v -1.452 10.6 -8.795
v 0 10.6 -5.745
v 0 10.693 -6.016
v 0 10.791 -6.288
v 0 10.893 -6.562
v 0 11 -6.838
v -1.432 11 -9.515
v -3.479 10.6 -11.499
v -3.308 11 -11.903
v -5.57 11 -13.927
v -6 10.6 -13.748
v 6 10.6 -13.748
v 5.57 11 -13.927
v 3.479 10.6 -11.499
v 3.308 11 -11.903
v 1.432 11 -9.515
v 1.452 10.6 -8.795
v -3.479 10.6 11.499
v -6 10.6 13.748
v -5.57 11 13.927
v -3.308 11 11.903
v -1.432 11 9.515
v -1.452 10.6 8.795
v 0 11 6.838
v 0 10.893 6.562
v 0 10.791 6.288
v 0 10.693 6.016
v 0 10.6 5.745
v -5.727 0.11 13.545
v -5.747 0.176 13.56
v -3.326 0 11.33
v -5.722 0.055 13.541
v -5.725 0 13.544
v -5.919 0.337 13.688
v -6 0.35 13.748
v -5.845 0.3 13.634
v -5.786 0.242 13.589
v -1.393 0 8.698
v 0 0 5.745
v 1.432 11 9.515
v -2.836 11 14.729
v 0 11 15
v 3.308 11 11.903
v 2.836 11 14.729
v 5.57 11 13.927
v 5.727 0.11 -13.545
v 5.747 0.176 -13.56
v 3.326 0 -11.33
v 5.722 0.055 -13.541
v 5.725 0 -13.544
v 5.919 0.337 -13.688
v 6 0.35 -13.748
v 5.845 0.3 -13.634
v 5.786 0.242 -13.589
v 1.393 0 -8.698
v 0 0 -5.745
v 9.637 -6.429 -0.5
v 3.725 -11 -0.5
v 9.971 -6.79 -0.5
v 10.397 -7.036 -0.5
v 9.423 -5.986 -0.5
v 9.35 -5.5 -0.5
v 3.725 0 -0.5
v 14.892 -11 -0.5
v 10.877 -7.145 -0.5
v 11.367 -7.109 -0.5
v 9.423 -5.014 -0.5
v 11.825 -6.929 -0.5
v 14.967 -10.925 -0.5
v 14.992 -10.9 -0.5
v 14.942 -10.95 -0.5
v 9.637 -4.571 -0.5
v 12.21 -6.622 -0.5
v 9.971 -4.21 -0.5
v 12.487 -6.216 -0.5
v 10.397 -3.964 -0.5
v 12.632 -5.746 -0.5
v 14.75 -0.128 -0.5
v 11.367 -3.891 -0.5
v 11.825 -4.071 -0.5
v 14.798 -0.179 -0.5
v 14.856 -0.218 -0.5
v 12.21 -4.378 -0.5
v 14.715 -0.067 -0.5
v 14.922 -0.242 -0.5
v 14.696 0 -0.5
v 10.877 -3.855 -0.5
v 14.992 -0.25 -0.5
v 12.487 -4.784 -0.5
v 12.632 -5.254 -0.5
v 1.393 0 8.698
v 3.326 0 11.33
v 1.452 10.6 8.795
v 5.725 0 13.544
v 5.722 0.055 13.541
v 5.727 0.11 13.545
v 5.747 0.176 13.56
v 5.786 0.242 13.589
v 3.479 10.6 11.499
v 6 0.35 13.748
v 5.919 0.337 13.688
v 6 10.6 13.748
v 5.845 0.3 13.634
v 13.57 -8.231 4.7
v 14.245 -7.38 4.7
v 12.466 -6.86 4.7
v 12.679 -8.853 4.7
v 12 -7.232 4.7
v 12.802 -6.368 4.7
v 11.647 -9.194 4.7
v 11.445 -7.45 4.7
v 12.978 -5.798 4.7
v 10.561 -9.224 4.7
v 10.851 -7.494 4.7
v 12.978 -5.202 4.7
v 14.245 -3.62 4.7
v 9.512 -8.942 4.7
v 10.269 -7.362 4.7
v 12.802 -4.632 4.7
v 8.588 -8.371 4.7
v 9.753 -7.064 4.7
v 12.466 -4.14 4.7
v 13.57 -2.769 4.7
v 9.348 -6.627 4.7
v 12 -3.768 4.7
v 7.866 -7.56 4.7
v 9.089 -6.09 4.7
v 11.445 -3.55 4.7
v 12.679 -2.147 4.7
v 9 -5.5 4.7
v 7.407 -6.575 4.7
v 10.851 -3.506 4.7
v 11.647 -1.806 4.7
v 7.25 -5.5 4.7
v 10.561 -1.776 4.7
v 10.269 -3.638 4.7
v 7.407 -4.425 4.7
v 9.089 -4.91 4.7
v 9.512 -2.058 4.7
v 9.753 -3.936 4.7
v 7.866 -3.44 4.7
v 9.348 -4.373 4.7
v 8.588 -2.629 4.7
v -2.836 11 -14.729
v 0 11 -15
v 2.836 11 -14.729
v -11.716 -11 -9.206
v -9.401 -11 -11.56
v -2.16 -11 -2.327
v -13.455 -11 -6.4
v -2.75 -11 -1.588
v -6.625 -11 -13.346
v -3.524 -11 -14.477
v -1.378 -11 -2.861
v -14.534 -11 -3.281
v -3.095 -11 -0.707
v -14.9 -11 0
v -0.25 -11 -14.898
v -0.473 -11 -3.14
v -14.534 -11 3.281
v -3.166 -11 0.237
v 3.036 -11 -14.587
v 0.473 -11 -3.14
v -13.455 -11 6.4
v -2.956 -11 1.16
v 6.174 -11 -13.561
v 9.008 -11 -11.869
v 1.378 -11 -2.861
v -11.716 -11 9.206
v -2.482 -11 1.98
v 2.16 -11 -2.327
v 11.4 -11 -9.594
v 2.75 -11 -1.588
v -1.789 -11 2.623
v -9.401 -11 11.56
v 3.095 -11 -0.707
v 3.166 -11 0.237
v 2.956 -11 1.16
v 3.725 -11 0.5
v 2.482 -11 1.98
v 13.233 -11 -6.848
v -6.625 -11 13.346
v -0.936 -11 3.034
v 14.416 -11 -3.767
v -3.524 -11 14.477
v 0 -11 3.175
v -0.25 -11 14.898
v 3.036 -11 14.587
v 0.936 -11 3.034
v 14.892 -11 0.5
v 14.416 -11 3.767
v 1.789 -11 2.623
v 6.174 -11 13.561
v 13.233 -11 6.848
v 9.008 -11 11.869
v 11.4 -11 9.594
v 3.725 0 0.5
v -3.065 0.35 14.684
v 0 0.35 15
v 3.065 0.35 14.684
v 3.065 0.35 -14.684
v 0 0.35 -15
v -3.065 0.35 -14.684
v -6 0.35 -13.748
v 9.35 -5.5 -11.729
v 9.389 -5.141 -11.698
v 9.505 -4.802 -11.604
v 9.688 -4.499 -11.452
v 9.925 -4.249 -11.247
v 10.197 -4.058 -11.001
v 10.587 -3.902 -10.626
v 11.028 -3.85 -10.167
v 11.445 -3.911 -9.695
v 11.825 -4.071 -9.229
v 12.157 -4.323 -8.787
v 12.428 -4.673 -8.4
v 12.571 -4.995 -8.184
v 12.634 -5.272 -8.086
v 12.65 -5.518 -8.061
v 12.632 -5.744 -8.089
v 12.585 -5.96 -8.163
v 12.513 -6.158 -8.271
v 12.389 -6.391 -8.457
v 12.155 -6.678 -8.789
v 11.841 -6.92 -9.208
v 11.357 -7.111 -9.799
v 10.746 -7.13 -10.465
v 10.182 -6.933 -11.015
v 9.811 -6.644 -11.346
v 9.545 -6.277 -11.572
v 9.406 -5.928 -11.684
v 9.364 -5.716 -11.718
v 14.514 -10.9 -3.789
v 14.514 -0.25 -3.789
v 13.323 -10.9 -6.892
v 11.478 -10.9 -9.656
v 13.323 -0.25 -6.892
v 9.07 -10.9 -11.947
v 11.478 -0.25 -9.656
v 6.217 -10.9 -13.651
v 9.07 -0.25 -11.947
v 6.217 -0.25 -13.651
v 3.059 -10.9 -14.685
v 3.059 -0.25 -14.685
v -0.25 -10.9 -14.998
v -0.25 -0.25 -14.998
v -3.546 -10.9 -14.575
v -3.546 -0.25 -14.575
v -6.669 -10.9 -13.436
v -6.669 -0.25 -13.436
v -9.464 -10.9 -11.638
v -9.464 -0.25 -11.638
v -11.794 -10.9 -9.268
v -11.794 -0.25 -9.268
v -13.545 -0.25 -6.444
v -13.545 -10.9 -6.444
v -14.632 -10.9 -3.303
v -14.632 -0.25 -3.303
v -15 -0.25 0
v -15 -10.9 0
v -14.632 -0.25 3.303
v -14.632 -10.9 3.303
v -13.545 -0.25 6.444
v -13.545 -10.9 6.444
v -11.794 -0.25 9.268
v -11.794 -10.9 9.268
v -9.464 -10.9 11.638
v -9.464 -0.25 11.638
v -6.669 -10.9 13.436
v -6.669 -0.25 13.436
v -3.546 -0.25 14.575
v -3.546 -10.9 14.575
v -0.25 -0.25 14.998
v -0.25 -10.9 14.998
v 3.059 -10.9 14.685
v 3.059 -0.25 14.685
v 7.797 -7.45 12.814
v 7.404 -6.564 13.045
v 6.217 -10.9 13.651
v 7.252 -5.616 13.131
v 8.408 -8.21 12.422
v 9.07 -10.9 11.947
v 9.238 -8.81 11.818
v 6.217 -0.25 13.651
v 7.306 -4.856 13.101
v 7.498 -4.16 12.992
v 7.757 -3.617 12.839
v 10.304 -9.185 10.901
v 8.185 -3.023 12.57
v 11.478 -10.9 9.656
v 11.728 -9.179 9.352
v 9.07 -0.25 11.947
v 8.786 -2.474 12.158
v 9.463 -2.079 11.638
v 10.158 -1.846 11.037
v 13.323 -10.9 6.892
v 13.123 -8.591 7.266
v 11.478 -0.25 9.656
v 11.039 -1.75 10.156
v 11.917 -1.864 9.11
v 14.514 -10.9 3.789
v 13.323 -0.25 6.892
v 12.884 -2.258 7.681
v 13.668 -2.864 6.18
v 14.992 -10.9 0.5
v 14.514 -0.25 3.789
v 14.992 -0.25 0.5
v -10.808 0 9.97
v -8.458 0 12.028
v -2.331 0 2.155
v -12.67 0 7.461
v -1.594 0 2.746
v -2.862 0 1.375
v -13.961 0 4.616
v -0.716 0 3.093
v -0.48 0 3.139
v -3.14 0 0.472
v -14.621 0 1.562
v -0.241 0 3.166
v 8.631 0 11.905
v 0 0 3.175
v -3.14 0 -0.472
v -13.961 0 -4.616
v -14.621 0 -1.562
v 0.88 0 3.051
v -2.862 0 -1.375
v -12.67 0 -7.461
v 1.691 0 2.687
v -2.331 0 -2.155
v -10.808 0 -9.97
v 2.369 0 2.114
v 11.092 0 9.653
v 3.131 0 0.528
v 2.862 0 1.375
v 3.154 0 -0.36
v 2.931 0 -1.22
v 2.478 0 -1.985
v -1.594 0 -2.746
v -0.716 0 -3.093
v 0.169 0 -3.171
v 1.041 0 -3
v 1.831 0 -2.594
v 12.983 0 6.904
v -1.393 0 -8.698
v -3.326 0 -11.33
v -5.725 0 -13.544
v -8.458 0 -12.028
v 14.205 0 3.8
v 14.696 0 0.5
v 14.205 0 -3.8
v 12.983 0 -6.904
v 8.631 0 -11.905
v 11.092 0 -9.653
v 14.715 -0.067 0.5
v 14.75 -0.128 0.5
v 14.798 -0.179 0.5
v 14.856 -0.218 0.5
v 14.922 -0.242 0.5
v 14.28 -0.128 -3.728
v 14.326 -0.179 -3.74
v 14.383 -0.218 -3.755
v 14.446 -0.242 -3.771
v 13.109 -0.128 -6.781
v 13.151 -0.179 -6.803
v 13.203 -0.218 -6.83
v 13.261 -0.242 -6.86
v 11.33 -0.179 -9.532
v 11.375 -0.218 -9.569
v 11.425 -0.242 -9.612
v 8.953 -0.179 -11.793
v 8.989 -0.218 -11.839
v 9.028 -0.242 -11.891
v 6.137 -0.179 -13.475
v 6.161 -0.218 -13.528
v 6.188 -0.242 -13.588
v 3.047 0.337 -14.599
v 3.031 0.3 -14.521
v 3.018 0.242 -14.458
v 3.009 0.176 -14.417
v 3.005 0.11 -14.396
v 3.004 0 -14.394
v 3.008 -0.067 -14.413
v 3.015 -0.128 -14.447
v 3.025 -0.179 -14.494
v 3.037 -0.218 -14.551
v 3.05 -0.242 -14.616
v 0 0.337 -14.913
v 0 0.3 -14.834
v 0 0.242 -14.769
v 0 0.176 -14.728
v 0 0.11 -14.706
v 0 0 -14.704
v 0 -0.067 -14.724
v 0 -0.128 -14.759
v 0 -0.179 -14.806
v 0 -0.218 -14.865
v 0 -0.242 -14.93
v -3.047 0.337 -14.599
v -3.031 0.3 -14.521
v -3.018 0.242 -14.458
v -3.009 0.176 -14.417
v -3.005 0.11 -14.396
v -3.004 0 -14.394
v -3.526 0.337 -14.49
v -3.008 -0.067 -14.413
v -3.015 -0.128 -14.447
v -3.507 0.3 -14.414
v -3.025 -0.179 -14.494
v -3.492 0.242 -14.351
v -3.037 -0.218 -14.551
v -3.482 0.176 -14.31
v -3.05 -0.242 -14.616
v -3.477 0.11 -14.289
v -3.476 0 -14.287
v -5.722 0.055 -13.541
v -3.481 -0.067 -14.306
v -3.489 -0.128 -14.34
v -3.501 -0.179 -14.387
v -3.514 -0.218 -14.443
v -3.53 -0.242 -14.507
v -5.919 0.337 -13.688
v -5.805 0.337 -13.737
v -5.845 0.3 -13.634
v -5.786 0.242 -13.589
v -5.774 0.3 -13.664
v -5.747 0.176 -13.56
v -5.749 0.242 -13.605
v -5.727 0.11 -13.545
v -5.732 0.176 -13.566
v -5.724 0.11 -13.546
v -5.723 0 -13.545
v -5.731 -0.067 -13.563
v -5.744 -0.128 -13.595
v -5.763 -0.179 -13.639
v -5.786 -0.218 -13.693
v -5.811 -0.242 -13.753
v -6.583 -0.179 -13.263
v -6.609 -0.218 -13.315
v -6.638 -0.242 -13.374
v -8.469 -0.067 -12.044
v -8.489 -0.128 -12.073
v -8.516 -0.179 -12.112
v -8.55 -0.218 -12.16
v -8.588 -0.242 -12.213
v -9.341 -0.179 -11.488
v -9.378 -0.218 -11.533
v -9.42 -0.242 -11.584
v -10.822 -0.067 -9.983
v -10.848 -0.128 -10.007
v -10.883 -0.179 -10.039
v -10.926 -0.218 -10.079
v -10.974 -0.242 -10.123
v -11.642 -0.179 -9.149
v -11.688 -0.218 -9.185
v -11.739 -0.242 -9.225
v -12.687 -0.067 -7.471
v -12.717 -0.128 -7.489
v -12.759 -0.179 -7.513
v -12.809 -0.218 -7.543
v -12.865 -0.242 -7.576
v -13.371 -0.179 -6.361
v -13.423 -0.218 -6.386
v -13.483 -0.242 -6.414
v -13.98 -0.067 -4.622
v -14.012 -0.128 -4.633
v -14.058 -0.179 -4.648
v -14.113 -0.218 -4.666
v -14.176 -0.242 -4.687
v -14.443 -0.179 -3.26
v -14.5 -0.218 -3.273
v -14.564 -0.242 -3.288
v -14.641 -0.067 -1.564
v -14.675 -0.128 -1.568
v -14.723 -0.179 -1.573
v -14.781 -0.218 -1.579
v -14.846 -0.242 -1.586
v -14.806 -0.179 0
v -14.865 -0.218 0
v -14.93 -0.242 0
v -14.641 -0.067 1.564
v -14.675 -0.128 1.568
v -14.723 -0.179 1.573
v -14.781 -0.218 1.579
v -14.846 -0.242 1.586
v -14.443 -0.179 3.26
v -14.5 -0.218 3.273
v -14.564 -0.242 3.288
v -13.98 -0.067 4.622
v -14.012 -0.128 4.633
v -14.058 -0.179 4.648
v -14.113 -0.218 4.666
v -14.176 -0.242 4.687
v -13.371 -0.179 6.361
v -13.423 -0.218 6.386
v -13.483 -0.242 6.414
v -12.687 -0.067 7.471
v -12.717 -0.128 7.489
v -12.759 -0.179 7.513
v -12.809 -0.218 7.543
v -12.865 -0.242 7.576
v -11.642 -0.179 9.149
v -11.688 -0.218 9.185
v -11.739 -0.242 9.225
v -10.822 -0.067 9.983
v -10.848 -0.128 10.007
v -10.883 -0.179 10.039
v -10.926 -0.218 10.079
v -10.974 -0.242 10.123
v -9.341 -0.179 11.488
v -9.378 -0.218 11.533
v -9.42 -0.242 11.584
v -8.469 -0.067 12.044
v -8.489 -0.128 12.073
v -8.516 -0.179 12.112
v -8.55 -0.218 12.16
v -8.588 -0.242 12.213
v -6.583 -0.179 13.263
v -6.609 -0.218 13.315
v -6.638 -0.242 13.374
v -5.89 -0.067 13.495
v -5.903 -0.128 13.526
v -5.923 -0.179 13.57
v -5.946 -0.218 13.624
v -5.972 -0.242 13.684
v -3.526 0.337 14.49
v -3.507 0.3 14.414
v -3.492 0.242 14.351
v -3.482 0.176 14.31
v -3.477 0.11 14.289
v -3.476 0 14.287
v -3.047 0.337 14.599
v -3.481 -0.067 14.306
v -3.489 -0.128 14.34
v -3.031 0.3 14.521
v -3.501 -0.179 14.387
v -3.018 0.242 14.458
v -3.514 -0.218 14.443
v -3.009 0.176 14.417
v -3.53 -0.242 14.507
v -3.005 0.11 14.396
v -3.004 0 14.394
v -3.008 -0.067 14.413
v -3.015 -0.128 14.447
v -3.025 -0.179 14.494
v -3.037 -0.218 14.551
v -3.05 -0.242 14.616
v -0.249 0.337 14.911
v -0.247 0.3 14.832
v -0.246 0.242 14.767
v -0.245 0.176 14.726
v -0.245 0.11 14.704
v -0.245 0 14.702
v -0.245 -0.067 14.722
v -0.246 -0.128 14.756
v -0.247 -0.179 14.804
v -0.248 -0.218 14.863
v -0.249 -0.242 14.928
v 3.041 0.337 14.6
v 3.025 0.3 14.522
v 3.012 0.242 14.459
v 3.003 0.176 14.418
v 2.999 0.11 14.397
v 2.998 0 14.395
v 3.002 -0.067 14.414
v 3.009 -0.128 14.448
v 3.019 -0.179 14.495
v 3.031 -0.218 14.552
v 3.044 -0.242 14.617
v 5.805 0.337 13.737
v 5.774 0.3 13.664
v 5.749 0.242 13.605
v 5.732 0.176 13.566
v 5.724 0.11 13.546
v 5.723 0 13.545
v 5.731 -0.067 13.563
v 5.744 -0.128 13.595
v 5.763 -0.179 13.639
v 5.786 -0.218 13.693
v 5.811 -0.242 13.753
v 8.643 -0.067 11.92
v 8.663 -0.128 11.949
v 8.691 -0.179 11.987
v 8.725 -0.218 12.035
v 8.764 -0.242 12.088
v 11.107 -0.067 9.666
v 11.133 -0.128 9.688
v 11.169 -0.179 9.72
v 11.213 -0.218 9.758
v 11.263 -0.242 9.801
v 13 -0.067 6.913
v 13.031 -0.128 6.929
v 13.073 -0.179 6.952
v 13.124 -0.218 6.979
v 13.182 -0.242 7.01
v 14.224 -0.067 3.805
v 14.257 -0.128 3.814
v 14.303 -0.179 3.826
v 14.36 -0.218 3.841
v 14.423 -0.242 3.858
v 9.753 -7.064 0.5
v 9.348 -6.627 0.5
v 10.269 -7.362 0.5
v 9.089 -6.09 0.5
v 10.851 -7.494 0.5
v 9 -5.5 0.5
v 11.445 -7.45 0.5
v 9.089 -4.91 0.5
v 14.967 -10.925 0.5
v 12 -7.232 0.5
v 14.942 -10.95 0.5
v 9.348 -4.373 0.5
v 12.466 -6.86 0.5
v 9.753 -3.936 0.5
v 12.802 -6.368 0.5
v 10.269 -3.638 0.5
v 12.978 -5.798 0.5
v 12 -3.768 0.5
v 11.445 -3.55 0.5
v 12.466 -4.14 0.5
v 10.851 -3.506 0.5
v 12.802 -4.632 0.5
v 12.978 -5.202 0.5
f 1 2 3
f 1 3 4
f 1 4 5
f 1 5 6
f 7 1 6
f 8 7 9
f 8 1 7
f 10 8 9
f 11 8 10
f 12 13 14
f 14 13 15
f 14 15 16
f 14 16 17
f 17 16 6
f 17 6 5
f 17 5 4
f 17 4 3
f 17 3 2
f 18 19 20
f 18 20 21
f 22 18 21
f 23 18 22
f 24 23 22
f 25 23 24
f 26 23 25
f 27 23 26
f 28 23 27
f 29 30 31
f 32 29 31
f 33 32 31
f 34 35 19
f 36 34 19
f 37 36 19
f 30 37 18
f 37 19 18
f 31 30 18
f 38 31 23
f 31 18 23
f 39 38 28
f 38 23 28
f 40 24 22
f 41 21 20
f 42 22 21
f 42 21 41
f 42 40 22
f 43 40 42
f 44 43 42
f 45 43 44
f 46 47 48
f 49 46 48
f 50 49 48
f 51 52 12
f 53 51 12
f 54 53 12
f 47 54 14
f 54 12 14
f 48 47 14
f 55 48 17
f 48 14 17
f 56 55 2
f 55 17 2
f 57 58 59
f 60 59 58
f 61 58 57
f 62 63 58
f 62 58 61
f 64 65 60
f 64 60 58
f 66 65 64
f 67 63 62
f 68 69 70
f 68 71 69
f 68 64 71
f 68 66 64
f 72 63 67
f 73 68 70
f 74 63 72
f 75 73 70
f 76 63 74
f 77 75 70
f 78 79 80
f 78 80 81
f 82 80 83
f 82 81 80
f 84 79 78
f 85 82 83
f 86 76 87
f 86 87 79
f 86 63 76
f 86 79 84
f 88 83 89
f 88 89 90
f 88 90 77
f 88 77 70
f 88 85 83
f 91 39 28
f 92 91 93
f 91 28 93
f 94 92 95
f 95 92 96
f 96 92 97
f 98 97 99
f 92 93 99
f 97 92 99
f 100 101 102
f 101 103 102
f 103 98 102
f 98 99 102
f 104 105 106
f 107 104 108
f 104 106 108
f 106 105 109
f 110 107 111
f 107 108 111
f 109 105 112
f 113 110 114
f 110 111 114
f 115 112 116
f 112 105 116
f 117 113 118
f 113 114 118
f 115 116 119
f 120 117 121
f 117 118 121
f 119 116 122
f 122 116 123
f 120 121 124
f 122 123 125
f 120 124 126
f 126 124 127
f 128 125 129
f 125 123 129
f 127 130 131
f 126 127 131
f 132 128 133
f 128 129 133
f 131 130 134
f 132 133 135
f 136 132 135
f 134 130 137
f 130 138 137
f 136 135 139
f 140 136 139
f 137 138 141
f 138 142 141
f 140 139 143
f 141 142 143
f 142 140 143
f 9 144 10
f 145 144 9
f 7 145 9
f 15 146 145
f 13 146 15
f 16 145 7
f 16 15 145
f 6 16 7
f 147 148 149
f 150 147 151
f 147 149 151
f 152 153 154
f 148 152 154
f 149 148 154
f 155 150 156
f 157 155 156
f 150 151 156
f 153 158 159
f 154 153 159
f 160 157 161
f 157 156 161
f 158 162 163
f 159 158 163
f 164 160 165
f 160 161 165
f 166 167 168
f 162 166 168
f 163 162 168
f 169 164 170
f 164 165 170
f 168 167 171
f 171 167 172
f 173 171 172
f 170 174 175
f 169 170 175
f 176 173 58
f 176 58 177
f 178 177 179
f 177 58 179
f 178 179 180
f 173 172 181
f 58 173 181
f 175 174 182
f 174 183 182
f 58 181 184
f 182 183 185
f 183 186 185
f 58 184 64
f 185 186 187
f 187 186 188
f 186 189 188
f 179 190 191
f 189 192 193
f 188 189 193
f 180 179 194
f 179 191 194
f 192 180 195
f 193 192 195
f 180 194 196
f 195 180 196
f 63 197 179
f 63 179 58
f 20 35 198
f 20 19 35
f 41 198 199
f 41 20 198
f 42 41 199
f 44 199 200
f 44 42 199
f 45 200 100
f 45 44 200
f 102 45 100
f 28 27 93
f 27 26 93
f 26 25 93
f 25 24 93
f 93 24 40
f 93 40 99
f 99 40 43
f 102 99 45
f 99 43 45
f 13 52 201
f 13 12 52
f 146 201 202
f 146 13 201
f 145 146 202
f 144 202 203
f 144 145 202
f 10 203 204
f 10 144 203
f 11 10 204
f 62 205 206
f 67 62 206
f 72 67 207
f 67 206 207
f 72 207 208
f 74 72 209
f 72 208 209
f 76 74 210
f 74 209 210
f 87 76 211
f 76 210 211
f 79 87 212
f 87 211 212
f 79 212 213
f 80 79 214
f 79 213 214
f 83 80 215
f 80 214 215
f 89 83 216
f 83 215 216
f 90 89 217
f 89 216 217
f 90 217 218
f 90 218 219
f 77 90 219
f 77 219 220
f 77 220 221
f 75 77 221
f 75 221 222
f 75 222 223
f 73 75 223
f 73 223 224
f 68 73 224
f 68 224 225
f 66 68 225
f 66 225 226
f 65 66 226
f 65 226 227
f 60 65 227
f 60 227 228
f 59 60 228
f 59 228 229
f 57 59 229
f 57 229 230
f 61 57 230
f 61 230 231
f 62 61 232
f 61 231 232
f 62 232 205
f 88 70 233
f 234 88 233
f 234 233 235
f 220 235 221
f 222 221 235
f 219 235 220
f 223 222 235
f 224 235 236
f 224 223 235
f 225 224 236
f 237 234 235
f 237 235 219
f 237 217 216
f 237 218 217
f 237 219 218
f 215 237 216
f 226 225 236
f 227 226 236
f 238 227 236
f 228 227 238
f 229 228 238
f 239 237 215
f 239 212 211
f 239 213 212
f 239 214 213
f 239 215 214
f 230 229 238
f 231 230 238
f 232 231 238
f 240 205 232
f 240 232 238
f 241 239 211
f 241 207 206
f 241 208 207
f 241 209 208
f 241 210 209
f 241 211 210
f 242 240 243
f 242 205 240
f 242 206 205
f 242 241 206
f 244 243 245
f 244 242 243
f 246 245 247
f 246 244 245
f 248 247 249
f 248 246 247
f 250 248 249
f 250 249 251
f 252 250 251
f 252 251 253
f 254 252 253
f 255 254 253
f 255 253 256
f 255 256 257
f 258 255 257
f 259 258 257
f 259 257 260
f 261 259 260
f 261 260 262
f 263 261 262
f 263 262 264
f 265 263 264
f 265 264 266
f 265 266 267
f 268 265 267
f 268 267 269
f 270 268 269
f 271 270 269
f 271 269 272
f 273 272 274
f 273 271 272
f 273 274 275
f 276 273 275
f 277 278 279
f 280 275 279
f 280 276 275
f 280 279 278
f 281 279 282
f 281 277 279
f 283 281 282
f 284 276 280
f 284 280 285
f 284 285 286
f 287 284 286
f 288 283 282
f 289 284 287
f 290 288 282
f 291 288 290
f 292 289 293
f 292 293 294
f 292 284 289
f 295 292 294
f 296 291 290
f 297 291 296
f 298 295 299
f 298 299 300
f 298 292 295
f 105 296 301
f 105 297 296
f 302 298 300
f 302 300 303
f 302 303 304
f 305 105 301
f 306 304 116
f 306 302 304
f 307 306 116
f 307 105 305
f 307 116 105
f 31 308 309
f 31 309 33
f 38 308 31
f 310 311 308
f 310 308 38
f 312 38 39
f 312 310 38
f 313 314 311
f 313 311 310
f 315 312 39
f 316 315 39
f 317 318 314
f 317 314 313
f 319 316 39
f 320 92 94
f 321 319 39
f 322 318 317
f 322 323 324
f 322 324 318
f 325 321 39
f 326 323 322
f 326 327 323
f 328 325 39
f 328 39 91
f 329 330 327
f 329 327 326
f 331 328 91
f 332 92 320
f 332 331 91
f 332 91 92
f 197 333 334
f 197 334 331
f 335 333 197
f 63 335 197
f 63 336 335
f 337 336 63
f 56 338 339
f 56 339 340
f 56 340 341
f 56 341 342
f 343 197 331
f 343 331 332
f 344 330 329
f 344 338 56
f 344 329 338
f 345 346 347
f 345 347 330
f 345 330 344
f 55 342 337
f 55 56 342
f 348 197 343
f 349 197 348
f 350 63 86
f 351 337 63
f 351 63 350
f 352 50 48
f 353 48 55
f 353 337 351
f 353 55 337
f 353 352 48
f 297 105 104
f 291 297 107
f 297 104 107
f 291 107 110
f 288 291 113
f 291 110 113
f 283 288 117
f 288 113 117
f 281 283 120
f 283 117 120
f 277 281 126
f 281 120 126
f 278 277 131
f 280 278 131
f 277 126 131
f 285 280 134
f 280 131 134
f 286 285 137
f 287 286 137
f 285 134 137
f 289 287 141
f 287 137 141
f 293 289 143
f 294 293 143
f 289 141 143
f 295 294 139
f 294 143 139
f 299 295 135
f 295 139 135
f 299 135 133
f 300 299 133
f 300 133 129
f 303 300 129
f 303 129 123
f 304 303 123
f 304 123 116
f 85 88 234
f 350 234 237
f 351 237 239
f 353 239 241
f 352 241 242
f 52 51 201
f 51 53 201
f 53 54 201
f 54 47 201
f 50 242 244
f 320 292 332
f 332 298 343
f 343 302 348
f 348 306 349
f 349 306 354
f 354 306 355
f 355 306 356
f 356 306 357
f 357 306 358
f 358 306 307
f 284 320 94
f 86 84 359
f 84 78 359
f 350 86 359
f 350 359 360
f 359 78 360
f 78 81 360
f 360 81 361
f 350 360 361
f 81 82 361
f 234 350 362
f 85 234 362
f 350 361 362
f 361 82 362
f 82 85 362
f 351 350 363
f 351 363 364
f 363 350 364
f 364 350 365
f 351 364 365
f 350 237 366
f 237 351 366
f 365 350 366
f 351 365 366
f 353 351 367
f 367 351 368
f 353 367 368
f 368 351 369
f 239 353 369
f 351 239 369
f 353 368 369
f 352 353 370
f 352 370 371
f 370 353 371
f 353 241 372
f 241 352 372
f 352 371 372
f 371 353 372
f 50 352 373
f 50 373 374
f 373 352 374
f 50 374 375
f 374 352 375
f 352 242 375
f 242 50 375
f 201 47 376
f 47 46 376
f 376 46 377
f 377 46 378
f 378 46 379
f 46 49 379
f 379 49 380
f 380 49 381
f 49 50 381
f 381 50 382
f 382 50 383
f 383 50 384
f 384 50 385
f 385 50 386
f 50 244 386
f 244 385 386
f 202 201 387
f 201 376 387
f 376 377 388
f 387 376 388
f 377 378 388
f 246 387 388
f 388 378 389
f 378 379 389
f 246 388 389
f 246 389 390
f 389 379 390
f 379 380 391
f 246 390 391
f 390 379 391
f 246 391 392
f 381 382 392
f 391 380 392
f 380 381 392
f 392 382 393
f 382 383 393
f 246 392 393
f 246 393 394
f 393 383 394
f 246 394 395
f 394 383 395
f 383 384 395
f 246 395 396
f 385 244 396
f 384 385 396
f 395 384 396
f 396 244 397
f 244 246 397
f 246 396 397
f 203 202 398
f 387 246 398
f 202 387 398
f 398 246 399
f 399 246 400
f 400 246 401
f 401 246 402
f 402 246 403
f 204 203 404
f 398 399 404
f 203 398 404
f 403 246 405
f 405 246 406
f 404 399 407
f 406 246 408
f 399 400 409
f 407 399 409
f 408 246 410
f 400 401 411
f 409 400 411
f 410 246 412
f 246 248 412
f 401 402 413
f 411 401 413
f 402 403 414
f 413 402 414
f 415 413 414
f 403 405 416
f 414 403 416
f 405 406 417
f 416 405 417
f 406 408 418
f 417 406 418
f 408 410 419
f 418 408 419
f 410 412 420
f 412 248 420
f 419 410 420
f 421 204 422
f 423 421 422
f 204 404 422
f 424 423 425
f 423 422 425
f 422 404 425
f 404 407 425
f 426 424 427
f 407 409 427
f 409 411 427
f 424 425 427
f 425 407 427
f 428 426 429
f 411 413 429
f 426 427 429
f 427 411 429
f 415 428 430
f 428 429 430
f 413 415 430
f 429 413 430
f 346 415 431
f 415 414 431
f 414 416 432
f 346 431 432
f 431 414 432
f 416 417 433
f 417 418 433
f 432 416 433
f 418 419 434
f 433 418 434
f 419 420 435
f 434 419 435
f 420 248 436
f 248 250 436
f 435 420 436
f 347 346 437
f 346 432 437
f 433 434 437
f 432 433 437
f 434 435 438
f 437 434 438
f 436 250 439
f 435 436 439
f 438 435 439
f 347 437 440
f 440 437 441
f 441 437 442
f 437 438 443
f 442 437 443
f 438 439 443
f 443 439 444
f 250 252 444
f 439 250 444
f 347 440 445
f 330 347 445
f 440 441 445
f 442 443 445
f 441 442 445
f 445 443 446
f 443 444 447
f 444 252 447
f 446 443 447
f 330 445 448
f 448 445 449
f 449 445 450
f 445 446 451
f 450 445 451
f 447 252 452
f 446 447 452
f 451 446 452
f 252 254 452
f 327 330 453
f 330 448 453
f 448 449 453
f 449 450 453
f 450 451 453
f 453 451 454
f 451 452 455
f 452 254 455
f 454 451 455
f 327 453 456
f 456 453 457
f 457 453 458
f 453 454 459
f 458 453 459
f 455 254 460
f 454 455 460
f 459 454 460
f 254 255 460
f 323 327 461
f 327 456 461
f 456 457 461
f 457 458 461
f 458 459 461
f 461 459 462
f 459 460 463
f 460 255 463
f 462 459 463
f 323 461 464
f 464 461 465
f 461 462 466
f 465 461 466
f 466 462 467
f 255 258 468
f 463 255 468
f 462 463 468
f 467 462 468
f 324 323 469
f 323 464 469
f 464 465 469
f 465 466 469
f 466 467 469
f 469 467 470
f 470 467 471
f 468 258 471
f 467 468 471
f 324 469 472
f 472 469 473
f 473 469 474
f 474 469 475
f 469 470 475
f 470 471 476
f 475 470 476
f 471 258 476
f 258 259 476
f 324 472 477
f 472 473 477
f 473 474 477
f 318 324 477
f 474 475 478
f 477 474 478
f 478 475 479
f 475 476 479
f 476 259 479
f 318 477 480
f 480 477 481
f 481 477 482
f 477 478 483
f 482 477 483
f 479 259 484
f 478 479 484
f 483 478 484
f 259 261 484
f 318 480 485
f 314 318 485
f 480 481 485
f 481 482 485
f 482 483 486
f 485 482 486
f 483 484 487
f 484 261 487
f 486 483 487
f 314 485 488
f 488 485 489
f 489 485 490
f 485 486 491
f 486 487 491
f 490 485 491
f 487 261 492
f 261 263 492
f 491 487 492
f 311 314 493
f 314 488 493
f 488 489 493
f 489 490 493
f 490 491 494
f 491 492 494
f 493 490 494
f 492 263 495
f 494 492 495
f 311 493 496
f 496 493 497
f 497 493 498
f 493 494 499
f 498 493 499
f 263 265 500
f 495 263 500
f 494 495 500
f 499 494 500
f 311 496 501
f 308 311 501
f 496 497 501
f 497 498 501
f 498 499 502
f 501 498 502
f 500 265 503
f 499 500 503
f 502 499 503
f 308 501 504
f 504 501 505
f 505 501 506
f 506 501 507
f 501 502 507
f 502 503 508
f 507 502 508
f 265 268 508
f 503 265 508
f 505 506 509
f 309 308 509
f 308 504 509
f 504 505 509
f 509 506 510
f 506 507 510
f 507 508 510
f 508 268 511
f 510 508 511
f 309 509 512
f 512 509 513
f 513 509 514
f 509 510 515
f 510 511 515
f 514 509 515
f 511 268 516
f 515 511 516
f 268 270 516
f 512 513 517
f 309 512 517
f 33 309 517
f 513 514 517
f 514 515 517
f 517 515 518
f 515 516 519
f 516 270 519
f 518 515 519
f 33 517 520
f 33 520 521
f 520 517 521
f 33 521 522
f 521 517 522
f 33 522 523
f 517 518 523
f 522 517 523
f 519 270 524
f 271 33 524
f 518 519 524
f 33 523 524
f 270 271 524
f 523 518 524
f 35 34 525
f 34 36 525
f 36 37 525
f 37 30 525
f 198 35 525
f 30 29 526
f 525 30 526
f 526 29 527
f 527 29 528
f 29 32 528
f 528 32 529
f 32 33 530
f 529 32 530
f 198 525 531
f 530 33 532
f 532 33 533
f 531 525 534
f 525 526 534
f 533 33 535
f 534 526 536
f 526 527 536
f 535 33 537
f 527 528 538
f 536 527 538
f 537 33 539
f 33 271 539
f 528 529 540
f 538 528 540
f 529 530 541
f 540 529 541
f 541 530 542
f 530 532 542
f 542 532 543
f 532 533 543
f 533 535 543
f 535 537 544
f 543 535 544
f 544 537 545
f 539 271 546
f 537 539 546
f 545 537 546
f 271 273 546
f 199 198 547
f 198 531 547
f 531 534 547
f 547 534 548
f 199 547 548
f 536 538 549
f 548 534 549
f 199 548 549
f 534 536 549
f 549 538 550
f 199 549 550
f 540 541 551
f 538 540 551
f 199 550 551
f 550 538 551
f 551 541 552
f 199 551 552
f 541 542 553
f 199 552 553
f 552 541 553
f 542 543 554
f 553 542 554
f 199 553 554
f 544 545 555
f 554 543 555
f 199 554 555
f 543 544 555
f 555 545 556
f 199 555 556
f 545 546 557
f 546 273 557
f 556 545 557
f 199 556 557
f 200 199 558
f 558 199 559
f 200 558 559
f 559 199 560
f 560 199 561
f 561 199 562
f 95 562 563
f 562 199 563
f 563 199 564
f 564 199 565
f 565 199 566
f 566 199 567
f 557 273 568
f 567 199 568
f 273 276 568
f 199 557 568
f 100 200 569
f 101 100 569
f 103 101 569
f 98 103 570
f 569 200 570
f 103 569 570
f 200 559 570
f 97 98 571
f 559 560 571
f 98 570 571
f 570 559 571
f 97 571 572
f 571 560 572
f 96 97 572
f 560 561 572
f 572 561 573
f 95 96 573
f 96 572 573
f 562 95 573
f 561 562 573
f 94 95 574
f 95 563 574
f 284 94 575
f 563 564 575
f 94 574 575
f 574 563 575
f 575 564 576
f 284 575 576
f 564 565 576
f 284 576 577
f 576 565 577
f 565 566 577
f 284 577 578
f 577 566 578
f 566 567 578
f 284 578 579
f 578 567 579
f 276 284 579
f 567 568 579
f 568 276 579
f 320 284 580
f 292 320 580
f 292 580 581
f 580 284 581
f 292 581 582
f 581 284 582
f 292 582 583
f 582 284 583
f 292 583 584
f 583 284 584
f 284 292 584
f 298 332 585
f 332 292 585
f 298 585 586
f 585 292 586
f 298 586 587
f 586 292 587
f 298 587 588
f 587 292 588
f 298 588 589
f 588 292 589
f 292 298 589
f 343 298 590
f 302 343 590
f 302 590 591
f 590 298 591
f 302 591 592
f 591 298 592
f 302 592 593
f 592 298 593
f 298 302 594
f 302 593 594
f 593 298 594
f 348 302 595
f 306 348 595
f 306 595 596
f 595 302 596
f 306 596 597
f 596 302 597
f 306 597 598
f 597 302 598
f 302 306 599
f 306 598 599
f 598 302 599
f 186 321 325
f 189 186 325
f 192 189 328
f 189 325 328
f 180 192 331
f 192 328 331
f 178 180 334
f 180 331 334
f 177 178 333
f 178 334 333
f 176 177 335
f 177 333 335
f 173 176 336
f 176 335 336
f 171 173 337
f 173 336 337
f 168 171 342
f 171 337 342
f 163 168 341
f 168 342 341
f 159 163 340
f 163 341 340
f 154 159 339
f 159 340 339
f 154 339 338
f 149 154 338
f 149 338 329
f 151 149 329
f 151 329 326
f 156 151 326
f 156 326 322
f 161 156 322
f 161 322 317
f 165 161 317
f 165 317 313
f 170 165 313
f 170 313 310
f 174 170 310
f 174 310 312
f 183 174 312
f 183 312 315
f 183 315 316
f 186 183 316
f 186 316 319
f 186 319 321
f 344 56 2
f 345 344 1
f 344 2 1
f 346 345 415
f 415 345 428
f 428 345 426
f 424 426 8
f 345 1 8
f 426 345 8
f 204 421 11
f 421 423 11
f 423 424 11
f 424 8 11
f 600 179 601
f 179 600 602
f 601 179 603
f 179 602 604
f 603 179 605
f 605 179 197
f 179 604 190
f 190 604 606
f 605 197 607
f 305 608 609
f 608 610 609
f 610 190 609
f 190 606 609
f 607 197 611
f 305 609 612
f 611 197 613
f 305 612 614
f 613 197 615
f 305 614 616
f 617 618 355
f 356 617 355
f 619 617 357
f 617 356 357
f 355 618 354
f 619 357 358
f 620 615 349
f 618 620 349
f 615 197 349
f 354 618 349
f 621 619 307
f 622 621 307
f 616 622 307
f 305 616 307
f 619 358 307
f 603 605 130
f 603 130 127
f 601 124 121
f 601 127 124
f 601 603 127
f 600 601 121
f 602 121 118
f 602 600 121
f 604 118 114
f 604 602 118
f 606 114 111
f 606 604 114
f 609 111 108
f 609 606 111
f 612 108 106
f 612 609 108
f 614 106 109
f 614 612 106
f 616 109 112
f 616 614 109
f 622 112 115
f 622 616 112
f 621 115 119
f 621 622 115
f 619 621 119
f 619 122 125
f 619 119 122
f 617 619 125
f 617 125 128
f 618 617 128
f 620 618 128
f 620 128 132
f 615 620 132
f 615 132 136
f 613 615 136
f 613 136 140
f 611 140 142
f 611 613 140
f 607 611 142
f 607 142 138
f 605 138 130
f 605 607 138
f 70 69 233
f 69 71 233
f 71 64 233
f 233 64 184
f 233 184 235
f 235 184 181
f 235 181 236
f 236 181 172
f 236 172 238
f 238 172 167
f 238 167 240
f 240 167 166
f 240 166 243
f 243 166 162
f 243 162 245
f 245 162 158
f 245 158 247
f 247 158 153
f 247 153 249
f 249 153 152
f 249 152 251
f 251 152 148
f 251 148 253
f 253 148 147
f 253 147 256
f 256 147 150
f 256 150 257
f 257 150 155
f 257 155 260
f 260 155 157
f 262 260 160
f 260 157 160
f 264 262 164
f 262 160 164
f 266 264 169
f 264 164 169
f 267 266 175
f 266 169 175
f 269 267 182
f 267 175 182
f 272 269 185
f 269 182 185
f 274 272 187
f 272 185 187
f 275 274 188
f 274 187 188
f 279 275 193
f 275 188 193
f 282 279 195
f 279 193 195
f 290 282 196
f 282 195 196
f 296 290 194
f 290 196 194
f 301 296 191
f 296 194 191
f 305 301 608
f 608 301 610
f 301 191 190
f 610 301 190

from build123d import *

# Parameters (mm, degrees)
SKETCH1_R             = 15
BOSS_EXTRUDE1_DEPTH   = 11
SKETCH2_R             = 3.175
CUT_EXTRUDE1_DEPTH    = 23
SKETCH3_R             = 17
CUT_EXTRUDE2_DEPTH    = 11
CUT_EXTRUDE3_DEPTH    = 11
SKETCH5_W             = 16.165630516
SKETCH5_H             = 1
CUT_EXTRUDE4_DEPTH    = 21
SKETCH6_R             = 2
CUT_EXTRUDE5_DEPTH    = 21
CUT_EXTRUDE6_START    = -4.2
SKETCH7_R             = 3.75
CUT_EXTRUDE6_DEPTH    = 21
M4_TAPPED_HOLE1_D     = 3.3
M4_TAPPED_HOLE1_DEPTH = 20.1
M4_TAPPED_HOLE1_TIP   = 0.991420021
CHAMFER2_SIZE         = 0.1
PAH1_SIZE             = 0.4
IZIM1_R               = 0.3


with BuildPart() as part:
    # Sketch1 → Boss-Extrude1 (new, symmetric)
    with BuildSketch(Plane(origin=(0, 0, 0), x_dir=(1, 0, 0), z_dir=(0, 1, 0))):
        with Locations(Location((0, 0, 0), (0, 0, 270))):
            Circle(SKETCH1_R)
    extrude(amount=BOSS_EXTRUDE1_DEPTH, both=True)

    # Sketch2 → Cut-Extrude1 (cut)
    with BuildSketch(Plane(origin=(0, 11, 0), x_dir=(1, 0, 0), z_dir=(0, 1, 0))):
        with Locations(Location((0, 0, 0), (0, 0, 270))):
            Circle(SKETCH2_R)
    extrude(amount=-CUT_EXTRUDE1_DEPTH, mode=Mode.SUBTRACT)

    # Sketch3 → Cut-Extrude2 (cut)
    with BuildSketch(Plane(origin=(0, 11, 0), x_dir=(1, 0, 0), z_dir=(0, 1, 0))):
        with Locations((16, 0)):
            Circle(SKETCH3_R)
    extrude(amount=-CUT_EXTRUDE2_DEPTH, mode=Mode.SUBTRACT)

    # Sketch4 → Cut-Extrude3 (cut)
    with BuildSketch(Plane(origin=(0, 11, 0), x_dir=(1, 0, 0), z_dir=(0, 1, 0))):
        with BuildLine():
            ThreePointArc((-6, 13.747727085), (-15, 0), (-6, -13.747727085))
            ThreePointArc((-6, -13.747727085), (-1.6187903, -9.065363068), (0.716230469, -3.093160021))
            ThreePointArc((0.716230469, -3.093160021), (-3.175, 0), (0.716230469, 3.093160021))
            ThreePointArc((0.716230469, 3.093160021), (-1.6187903, 9.065363068), (-6, 13.747727085))
        make_face()
    extrude(amount=-CUT_EXTRUDE3_DEPTH, mode=Mode.SUBTRACT)

    # Sketch5 → Cut-Extrude4 (cut)
    with BuildSketch(Plane(origin=(0, 0, 0), x_dir=(1, 0, 0), z_dir=(0, 1, 0))):
        with Locations((11.807437966, 0)):
            Rectangle(SKETCH5_W, SKETCH5_H)
    extrude(amount=-CUT_EXTRUDE4_DEPTH, mode=Mode.SUBTRACT)

    # Sketch6 → Cut-Extrude5 (cut)
    with BuildSketch(Plane.XY):
        with Locations(Location((11, -5.5, 0), (0, 0, 180))):
            Circle(SKETCH6_R)
    extrude(amount=CUT_EXTRUDE5_DEPTH, mode=Mode.SUBTRACT)

    # Sketch7 → Cut-Extrude6 (cut)
    with BuildSketch(Plane(origin=(0, 0, 0.5), x_dir=(-1, 0, 0), z_dir=(0, 0, -1)).offset(CUT_EXTRUDE6_START)):
        with Locations((-11, -5.5)):
            Circle(SKETCH7_R)
    extrude(amount=-CUT_EXTRUDE6_DEPTH, mode=Mode.SUBTRACT)

    # M4 Tapped Hole1
    with Locations(Plane.XY.offset(-0.5)):
        with Locations((11, -5.5)):
            Hole(M4_TAPPED_HOLE1_D / 2, depth=M4_TAPPED_HOLE1_DEPTH)
            with Locations((0, 0, -(M4_TAPPED_HOLE1_DEPTH + M4_TAPPED_HOLE1_TIP / 2))):  # 118° drill point
                Cone(0, M4_TAPPED_HOLE1_D / 2, M4_TAPPED_HOLE1_TIP, mode=Mode.SUBTRACT)

    # Chamfer2
    chamfer2_edges = [part.edges().sort_by_distance(p)[0] for p in [
        (-15, -11, 0),
    ]]
    chamfer(chamfer2_edges, length=CHAMFER2_SIZE)

    # Pah1
    pah1_edges = [part.edges().sort_by_distance(p)[0] for p in [
        (2.398064099, 11, -10.197418288),
        (2.398064099, 11, 10.197418288),
        (-2.398064099, 11, 10.197418288),
        (-2.398064099, 11, -10.197418288),
    ]]
    chamfer(pah1_edges, length=PAH1_SIZE)

    # Çizim1 → Kes-Döndür4 (revolve, cut)
    with BuildSketch(Plane(origin=(0, 0, 0), x_dir=(0, 0, -1), z_dir=(1, 0, 0))):
        with Locations((15, 0.05)):
            Circle(IZIM1_R)
    revolve(axis=Axis((0, -10.9, 0), (0, 1, 0)), mode=Mode.SUBTRACT)


solid = part.part
